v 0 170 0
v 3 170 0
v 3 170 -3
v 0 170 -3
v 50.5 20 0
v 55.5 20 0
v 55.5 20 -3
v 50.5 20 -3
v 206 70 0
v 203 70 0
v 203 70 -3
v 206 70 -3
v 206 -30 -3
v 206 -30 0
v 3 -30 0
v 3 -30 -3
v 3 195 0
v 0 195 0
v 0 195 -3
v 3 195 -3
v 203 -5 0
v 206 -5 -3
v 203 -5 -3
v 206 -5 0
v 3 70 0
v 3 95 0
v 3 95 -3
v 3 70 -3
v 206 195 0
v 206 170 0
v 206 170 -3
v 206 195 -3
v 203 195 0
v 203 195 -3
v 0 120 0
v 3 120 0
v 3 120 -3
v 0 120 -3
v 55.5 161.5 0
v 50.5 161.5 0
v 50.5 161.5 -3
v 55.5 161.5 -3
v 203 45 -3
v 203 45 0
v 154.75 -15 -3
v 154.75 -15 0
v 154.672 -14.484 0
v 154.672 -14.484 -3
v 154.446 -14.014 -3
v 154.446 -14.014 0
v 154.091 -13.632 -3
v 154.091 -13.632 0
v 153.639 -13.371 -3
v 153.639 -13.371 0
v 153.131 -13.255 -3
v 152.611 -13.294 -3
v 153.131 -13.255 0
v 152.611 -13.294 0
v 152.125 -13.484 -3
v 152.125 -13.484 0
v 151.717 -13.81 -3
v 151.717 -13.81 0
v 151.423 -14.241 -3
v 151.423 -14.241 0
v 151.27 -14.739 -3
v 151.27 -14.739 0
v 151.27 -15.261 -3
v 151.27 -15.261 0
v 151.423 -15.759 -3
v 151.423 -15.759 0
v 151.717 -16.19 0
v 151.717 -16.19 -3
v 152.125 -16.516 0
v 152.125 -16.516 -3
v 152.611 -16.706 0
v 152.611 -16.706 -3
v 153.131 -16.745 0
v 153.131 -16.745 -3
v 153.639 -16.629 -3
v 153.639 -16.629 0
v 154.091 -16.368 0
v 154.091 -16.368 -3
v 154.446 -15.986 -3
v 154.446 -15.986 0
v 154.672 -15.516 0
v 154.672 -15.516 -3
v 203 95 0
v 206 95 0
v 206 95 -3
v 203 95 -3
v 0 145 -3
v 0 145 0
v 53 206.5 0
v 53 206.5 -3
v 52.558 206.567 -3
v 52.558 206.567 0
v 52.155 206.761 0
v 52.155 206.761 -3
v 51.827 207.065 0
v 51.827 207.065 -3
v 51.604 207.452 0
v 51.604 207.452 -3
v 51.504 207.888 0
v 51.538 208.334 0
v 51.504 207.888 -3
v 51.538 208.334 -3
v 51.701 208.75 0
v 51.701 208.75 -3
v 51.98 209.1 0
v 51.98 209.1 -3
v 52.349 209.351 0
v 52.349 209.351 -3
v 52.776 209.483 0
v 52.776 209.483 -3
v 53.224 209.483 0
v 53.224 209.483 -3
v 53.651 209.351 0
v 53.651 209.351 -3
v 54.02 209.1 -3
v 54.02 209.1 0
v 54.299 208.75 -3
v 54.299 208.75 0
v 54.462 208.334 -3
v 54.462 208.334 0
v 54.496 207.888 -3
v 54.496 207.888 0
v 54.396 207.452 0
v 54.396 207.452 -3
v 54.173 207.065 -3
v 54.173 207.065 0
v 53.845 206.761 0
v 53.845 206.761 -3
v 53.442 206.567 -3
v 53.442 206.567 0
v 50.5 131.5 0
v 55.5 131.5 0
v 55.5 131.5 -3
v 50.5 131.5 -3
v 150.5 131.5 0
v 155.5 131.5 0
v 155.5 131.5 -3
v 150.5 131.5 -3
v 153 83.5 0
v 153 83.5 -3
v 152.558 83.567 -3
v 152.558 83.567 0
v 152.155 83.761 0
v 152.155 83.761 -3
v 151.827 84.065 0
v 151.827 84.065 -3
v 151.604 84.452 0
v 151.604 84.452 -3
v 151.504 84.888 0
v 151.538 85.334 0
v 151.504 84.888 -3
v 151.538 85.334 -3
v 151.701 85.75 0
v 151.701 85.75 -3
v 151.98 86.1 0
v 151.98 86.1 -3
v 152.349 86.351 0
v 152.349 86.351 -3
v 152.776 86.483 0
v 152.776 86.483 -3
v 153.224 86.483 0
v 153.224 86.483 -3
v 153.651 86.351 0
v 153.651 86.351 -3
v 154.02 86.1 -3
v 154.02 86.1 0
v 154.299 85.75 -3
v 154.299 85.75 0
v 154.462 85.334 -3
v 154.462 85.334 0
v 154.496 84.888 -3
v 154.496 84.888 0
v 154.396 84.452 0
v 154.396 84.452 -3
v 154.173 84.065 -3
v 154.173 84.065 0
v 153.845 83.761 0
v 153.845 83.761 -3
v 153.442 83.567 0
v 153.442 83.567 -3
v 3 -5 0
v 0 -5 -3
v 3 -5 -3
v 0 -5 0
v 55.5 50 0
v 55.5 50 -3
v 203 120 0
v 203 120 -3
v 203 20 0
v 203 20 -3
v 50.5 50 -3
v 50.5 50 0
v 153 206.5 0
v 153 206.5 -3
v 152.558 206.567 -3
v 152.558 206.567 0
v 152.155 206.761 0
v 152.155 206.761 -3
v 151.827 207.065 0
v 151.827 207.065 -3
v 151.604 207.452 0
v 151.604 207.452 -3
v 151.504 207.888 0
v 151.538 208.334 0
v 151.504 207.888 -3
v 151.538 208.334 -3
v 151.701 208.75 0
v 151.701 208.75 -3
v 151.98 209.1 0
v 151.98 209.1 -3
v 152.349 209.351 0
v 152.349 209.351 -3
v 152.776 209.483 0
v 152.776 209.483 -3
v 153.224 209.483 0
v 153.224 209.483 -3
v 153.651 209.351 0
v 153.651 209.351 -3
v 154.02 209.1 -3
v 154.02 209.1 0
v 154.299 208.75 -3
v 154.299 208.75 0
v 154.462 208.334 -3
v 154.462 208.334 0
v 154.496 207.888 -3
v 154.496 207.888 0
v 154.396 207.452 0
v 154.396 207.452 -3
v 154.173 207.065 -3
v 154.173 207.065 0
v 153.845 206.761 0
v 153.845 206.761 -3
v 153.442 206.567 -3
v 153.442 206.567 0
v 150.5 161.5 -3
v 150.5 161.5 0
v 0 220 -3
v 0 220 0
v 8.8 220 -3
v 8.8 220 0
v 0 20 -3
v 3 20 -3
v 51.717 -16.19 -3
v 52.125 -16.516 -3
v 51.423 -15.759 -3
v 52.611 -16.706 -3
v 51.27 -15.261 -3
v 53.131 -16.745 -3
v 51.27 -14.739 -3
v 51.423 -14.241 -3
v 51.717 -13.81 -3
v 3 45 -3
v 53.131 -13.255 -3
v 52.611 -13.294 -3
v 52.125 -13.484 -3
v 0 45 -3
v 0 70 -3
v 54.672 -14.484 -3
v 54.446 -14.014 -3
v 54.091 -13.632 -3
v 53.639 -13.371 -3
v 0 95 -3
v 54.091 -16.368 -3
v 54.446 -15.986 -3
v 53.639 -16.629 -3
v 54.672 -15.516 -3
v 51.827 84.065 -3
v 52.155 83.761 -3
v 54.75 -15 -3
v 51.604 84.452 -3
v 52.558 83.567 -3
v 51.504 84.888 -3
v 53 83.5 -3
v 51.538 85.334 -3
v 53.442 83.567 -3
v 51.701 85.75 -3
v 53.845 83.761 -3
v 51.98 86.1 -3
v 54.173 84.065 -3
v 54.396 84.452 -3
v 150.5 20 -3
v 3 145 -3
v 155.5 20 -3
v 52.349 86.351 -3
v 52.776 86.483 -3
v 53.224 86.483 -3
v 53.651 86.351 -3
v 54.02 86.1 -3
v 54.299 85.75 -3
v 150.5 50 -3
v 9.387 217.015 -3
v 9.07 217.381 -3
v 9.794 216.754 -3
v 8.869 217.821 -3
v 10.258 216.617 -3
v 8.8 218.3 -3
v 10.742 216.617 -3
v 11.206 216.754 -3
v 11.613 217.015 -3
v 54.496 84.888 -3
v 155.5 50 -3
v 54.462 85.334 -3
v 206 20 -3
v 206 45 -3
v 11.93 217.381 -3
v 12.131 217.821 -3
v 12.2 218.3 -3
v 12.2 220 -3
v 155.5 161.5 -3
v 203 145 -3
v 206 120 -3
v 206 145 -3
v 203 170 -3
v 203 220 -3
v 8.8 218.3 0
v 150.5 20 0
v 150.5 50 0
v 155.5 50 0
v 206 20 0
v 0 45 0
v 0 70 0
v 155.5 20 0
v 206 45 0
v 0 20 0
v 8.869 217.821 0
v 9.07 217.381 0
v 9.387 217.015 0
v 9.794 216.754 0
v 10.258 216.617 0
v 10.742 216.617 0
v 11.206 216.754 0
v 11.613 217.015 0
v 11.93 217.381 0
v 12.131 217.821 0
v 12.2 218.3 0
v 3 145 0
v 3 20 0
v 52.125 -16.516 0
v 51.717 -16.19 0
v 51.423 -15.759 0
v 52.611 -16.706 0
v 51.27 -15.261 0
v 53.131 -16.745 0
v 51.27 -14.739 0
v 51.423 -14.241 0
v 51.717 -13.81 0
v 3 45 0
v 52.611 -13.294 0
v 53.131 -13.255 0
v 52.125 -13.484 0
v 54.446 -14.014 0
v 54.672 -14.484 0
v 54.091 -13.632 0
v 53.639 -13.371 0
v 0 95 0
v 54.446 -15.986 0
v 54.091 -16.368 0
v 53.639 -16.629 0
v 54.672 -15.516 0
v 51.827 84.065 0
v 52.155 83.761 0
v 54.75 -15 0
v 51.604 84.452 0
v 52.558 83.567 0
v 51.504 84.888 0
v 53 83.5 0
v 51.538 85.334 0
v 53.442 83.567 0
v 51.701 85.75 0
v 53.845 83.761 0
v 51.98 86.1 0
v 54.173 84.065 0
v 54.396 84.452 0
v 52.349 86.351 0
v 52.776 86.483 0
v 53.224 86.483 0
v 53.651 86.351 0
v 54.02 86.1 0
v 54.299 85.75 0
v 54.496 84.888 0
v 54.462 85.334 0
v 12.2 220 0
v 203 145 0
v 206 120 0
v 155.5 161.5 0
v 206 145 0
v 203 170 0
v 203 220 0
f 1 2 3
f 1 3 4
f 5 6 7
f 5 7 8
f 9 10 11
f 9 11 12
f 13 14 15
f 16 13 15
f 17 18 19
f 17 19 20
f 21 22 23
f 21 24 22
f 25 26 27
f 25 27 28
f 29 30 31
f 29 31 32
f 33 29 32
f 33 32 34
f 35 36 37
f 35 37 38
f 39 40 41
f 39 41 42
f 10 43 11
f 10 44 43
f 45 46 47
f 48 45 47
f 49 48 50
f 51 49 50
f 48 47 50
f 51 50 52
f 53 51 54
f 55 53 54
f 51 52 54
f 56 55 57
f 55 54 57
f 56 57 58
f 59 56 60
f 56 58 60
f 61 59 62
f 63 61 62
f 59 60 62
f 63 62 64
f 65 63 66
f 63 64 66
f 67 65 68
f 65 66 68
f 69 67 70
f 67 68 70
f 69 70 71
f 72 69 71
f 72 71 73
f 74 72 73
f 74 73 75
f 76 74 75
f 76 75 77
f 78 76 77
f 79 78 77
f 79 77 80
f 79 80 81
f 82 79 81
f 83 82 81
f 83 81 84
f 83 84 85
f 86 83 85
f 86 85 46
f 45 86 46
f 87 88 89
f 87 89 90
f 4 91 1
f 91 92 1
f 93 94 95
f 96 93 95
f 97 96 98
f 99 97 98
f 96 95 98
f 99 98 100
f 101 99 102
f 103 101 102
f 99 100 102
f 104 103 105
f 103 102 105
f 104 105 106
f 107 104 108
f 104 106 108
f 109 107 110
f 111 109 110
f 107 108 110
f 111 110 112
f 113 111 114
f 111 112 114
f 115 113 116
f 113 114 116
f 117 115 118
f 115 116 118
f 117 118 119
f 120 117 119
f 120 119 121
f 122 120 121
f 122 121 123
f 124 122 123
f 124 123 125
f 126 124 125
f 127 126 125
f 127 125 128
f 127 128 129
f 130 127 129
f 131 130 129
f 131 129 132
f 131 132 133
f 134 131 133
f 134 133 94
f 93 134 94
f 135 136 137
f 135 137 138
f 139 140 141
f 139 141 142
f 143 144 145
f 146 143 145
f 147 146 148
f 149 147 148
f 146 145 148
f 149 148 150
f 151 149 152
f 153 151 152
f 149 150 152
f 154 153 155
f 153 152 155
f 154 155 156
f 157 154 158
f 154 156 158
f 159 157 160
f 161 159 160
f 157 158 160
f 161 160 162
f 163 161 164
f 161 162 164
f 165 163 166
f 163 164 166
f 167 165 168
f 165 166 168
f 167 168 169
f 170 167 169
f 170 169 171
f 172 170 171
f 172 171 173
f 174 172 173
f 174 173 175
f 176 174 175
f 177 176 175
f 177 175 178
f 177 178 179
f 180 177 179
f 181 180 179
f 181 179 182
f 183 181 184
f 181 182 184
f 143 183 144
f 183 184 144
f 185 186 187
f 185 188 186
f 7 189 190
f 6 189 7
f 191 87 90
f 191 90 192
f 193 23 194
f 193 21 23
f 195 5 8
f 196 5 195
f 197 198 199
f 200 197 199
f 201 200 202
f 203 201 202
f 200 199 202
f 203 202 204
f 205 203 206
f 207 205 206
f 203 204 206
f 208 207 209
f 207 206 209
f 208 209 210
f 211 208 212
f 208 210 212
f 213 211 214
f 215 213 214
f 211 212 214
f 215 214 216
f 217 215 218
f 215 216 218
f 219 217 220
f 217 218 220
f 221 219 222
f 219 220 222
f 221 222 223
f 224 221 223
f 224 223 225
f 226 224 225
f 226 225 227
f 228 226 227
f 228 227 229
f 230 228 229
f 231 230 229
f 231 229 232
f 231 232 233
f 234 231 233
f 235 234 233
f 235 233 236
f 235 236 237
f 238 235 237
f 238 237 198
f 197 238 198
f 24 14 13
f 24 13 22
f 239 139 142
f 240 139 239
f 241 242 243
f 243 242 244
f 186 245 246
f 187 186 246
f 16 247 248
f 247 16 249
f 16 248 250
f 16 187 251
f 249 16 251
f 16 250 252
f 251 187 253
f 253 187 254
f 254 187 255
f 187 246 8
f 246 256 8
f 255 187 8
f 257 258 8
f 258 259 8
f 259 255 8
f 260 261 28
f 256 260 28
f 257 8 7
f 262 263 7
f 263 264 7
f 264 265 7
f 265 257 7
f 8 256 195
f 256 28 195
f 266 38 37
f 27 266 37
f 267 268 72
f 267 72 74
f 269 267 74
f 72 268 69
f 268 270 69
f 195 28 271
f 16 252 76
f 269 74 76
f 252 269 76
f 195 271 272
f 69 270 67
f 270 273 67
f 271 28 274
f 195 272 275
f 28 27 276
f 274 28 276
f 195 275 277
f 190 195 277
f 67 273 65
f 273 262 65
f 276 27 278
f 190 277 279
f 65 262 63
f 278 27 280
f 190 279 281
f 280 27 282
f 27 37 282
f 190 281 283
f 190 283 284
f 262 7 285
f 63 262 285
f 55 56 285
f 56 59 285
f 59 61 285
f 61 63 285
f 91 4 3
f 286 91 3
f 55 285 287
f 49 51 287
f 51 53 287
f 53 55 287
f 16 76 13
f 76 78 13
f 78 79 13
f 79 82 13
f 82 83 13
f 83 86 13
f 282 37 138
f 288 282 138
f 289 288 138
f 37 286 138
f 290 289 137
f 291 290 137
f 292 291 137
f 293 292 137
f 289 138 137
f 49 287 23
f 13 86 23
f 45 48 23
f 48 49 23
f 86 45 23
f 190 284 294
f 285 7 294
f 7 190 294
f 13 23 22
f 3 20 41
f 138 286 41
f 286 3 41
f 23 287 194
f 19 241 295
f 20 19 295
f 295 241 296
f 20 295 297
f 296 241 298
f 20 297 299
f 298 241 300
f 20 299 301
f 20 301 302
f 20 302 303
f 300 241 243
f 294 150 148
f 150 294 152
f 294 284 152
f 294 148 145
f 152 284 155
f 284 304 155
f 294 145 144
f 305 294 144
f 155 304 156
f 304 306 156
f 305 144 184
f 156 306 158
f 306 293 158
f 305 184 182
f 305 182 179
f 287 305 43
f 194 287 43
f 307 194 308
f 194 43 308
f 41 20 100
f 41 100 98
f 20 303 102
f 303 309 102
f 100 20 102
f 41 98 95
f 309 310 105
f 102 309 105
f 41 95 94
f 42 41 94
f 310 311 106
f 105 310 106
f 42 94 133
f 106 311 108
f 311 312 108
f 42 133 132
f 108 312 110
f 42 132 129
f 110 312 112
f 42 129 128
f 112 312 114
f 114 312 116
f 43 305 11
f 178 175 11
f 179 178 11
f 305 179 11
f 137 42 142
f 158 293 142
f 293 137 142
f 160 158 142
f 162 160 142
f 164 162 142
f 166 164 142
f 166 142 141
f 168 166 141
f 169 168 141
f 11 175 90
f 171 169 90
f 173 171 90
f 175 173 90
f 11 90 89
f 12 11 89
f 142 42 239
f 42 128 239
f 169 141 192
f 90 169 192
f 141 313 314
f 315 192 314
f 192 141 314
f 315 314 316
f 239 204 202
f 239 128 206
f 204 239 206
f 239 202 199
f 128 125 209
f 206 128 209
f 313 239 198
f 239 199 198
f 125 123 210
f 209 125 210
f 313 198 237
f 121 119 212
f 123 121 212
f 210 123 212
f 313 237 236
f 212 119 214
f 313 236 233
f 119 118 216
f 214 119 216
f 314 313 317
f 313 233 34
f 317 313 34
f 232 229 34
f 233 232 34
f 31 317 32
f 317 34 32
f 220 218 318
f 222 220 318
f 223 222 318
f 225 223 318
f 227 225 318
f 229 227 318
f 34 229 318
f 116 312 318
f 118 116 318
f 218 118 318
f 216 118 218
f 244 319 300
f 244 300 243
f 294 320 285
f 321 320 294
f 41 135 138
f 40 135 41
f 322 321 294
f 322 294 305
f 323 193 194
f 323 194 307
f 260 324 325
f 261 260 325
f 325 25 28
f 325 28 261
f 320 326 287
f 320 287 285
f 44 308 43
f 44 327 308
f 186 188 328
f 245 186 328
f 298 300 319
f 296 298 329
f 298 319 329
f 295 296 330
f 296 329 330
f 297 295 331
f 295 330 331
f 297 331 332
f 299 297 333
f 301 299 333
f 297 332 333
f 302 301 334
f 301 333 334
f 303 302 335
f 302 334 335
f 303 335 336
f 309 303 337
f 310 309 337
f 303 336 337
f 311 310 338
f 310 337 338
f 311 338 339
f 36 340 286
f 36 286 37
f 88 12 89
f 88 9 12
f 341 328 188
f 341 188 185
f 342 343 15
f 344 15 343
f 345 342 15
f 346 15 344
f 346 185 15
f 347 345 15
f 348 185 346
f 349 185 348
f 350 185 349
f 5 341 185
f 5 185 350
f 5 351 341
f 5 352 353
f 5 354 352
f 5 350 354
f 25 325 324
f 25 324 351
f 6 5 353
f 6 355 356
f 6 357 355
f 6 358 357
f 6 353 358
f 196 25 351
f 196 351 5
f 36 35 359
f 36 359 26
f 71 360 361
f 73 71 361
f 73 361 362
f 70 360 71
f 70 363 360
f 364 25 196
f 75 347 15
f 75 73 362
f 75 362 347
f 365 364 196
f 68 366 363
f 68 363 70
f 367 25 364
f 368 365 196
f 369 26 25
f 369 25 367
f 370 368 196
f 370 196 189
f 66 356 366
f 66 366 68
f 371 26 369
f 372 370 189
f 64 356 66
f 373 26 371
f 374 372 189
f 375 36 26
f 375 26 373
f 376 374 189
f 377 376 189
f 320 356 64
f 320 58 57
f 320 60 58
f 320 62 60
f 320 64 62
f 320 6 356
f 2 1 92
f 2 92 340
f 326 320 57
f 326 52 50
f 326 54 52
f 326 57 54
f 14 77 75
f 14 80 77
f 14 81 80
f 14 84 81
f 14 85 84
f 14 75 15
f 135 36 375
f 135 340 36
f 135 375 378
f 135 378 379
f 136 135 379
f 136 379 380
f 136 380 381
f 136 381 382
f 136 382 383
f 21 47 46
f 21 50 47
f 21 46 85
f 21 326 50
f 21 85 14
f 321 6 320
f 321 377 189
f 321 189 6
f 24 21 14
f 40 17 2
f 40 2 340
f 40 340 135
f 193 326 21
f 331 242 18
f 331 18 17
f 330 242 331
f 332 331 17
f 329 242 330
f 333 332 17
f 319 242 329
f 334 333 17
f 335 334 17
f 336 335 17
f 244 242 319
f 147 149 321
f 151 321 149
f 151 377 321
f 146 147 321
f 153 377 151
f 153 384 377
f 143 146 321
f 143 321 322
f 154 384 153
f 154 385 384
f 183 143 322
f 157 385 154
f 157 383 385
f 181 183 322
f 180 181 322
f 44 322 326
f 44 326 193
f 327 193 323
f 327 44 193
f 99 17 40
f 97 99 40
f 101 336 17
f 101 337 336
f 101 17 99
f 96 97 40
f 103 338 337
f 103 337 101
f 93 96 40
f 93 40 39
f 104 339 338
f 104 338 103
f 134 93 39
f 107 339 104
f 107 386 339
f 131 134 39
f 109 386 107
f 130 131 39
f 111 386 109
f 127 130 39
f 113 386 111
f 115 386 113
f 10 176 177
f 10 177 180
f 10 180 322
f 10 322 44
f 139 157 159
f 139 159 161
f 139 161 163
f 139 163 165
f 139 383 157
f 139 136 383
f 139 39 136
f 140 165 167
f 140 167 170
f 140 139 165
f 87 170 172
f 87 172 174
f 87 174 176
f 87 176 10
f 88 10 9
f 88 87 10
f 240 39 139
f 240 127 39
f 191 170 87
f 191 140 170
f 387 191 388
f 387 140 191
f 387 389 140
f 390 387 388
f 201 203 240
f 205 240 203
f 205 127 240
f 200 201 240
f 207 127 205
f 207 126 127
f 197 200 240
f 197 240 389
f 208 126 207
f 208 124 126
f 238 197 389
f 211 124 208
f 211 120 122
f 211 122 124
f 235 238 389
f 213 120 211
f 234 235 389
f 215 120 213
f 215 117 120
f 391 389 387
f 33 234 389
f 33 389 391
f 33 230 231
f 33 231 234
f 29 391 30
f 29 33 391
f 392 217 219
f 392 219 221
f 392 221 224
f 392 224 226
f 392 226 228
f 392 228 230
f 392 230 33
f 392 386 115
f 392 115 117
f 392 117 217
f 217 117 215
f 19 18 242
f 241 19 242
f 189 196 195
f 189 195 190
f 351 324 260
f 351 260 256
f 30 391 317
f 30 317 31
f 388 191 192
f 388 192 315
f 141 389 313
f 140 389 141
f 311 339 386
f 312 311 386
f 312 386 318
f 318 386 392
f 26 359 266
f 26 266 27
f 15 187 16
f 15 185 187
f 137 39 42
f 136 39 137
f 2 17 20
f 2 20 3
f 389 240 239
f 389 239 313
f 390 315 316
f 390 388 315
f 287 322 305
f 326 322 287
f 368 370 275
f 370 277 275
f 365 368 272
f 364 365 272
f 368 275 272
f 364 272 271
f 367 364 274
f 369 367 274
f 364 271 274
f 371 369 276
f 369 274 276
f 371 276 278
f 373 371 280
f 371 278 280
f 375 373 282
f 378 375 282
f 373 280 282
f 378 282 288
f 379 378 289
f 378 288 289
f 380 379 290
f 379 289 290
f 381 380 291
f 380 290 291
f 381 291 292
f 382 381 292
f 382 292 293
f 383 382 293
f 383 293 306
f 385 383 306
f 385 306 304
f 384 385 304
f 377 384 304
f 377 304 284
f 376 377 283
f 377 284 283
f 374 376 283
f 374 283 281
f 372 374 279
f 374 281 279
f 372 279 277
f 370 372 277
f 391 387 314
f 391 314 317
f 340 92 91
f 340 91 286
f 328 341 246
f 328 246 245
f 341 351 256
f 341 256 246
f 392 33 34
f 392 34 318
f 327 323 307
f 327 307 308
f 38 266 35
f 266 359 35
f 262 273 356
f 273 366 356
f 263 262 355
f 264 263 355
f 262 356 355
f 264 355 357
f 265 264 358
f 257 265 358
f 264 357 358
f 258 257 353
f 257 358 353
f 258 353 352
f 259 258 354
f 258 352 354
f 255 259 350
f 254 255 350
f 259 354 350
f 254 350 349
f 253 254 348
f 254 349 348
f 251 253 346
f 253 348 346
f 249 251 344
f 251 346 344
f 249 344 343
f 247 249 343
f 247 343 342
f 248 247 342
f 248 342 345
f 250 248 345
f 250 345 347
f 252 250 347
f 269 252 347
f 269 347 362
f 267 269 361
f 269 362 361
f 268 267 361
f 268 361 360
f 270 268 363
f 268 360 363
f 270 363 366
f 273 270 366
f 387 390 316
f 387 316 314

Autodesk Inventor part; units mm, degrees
ref_plane "YZ Plane" through (0, 0, 0) normal (1, 0, 0) x (0, 1, 0)
ref_plane "XZ Plane" through (0, 0, 0) normal (0, 1, 0) x (-1, 0, 0)
ref_plane "XY Plane" through (0, 0, 0) normal (0, 0, 1) x (1, 0, 0)
sketch "Boceto1" plane through (0, 0, 0) normal (0, 0, 1) x (1, 0, 0)
  line L0 (206, -30) -> (206, 220) projected
  line L1 (0, 220) -> (206, 220) projected
  line L2 (0, -30) -> (0, 220) projected
  line L3 (206, -30) -> (0, -30) projected
  line L4 (206, -30) -> (206, -5)
  line L5 (206, -5) -> (203, -5)
  line L6 (203, -5) -> (203, 20)
  line L7 (203, 20) -> (206, 20)
  line L8 (206, 20) -> (206, 45)
  line L9 (206, 45) -> (203, 45)
  line L10 (203, 45) -> (203, 70)
  line L11 (203, 70) -> (206, 70)
  line L12 (206, 70) -> (206, 95)
  line L13 (206, 95) -> (203, 95)
  line L14 (203, 95) -> (203, 120)
  line L15 (203, 120) -> (206, 120)
  line L16 (206, 120) -> (206, 145)
  line L17 (206, 145) -> (203, 145)
  line L18 (203, 145) -> (203, 170)
  line L19 (203, 170) -> (206, 170)
  line L20 (203, 220) -> (206, 220)
  line L21 (206, 195) -> (203, 195)
  line L22 (203, 195) -> (203, 220)
  line L23 (206, 170) -> (206, 195)
  line L24 (203, 170) -> (206, 170)
  line L25 (0, 220) -> (0, 195)
  line L26 (0, 195) -> (3, 195)
  line L27 (3, 195) -> (3, 170)
  line L28 (3, 170) -> (0, 170)
  line L29 (0, 170) -> (0, 145)
  line L30 (0, 145) -> (3, 145)
  line L31 (3, 145) -> (3, 120)
  line L32 (3, 120) -> (0, 120)
  line L33 (3, 20) -> (0, 20)
  line L34 (0, 45) -> (3, 45)
  line L35 (3, 45) -> (3, 20)
  line L36 (0, 70) -> (0, 45)
  line L37 (3, 70) -> (0, 70)
  line L38 (3, 95) -> (3, 70)
  line L39 (0, 95) -> (3, 95)
  line L40 (0, 120) -> (0, 95)
  line L41 (3, 20) -> (0, 20)
  line L42 (0, 20) -> (0, -5)
  line L43 (0, -5) -> (3, -5)
  line L44 (3, -5) -> (3, -30)
  line L45 (3, -30) -> (0, -30)
  line L46 (203, 220) -> (206, 220)
  line L47 (203, 220) -> (206, 220)
  line L48 (206, 220) -> (206, 245)
  line L49 (206, 245) -> (203, 245)
  line L50 (203, 245) -> (203, 270)
  line L51 (203, 270) -> (206, 270)
  line L52 (0, 220) -> (3, 220)
  line L53 (0, 220) -> (3, 220)
  line L54 (3, 220) -> (3, 245)
  line L55 (3, 245) -> (0, 245)
  line L56 (0, 245) -> (0, 270)
  line L57 (0, 270) -> (3, 270)
  line L58 (206, 270) -> (0, 270)
  point P0 (0, 0)
  dimension "d78" = 3
  dimension "d88" = 3
  dimension "Lengueta" = 25
  dimension "espesor" = 3
  dimension "d2" = 25
  dimension "d3" = 3
  dimension "d4" = 25
  dimension "d5" = 90
  dimension "d6" = 3
  dimension "d7" = 25
  dimension "d8" = 3
  dimension "d9" = 25
  dimension "d10" = 3
  dimension "d11" = 25
  dimension "d12" = 3
  dimension "d13" = 25
  dimension "d14" = 90
  dimension "d15" = 3
  dimension "d16" = 25
  dimension "d17" = 3
  dimension "d18" = 3
  dimension "d19" = 25
  dimension "d20" = 90
  dimension "d21" = 3
  dimension "d22" = 25
  dimension "d23" = 3
  dimension "d26" = 25
  dimension "d27" = 3
  dimension "d28" = 25
  dimension "d29" = 3
  dimension "d30" = 25
  dimension "d31" = 90
  dimension "d32" = 3
  dimension "d33" = 25
  dimension "d34" = 3
  dimension "d35" = 25
  dimension "d36" = 3
  dimension "d37" = 25
  dimension "d38" = 3
  dimension "d39" = 25
  dimension "d40" = 90
  dimension "d41" = 3
  dimension "d42" = 25
  dimension "d43" = 3
  dimension "d44" = 3
  dimension "d45" = 25
  dimension "d46" = 90
  dimension "d47" = 3
  dimension "d48" = 25
  dimension "d49" = 3
  dimension "d71" = 3
  dimension "d72" = 3
  dimension "d73" = 25
  dimension "d74" = 90
  dimension "d75" = 3
  dimension "d76" = 25
  dimension "d77" = 3
  dimension "d81" = 3
  dimension "d82" = 3
  dimension "d83" = 25
  dimension "d84" = 90
  dimension "d85" = 3
  dimension "d86" = 25
  dimension "d87" = 3
extrude "Extrusión1" add sketch "Boceto1" against normal blind 3 contours L3 L44 L43 L2 L33 L35 L34 L37 L38 L39 L32 L31 L30 L28 L27 L26 L1 L22 L21 L0 L19 L18 L17 L15 L14 L13 L11 L10 L9 L7 L6 L5
sketch "Boceto2" plane through (0, 0, 0) normal (0, 0, 1) x (1, 0, 0)
  circle A0 centre (53, -15) radius 1.75
  circle A1 centre (153, -15) radius 1.75
  point P0 (0, 0)
extrude "Extrusión2" cut sketch "Boceto2" against normal blind 3
sketch "Boceto3" plane through (0, 0, 0) normal (0, 0, 1) x (1, 0, 0)
  circle A0 centre (53, 208) radius 2.1
  circle A1 centre (53, 208) radius 1.5
  circle A2 centre (153, 208) radius 2.1
  point P0 (0, 0)
  dimension "d56" = 3
hole "Agujero1" at (53, 208, 0) at (153, 208, 0) direction (0, 0, -1) diameter 3 depth 4
sketch "Boceto4" plane through (0, 0, 0) normal (0, 0, 1) x (1, 0, 0)
  circle A0 centre (53, 85) radius 2.1 projected
  circle A1 centre (153, 85) radius 2.1 projected
  point P0 (0, 0)
hole "Agujero2" at (153, 85, 0) at (53, 85, 0) direction (0, 0, -1) diameter 3 depth 4
sketch "Boceto5" plane through (0, 0, -3) normal (0, 0, -1) x (-1, 0, 0)
  point P0 (0, 0)
sketch "Boceto6" plane through (0, 0, 0) normal (0, 0, 1) x (1, 0, 0)
  circle A0 centre (53, 85) radius 1.5 projected
  circle A1 centre (153, 85) radius 1.5 projected
  circle A2 centre (153, 208) radius 1.5 projected
  circle A3 centre (53, 208) radius 1.5 projected
  circle A4 centre (53, -15) radius 1.75 projected
  circle A5 centre (153, -15) radius 1.75 projected
  line L0 (203, 20) -> (206, 20) projected
  line L1 (206, 20) -> (206, 45) projected
  line L2 (206, 45) -> (203, 45) projected
  line L3 (203, 45) -> (203, 70) projected
  line L4 (203, 70) -> (206, 70) projected
  line L5 (206, 70) -> (206, 95) projected
  line L6 (206, 95) -> (203, 95) projected
  line L7 (203, 95) -> (203, 120) projected
  line L8 (203, 120) -> (206, 120) projected
  line L9 (206, 120) -> (206, 145) projected
  line L10 (206, 145) -> (203, 145) projected
  line L11 (203, 145) -> (203, 170) projected
  line L12 (203, 170) -> (206, 170) projected
  line L13 (206, 170) -> (206, 195) projected
  line L14 (206, 195) -> (203, 195) projected
  line L15 (203, 195) -> (203, 220) projected
  line L16 (203, 220) -> (0, 220) projected
  line L17 (0, 220) -> (0, 195) projected
  line L18 (0, 195) -> (3, 195) projected
  line L19 (3, 195) -> (3, 170) projected
  line L20 (3, 170) -> (0, 170) projected
  line L21 (0, 170) -> (0, 145) projected
  line L22 (0, 145) -> (3, 145) projected
  line L23 (3, 145) -> (3, 120) projected
  line L24 (3, 120) -> (0, 120) projected
  line L25 (0, 120) -> (0, 95) projected
  line L26 (0, 95) -> (3, 95) projected
  line L27 (3, 95) -> (3, 70) projected
  line L28 (3, 70) -> (0, 70) projected
  line L29 (0, 70) -> (0, 45) projected
  line L30 (0, 45) -> (3, 45) projected
  line L31 (3, 45) -> (3, 20) projected
  line L32 (3, 20) -> (0, 20) projected
  line L33 (0, 20) -> (0, -5) projected
  line L34 (0, -5) -> (3, -5) projected
  line L35 (3, -5) -> (3, -30) projected
  line L36 (3, -30) -> (206, -30) projected
  line L37 (206, -30) -> (206, -5) projected
  line L38 (206, -5) -> (203, -5) projected
  line L39 (203, -5) -> (203, 20) projected
  line L40 (153, 85) -> (153, 208)
  line L41 (150.5, 161.5) -> (155.5, 161.5)
  line L42 (155.5, 161.5) -> (155.5, 131.5)
  line L43 (155.5, 131.5) -> (150.5, 131.5)
  line L44 (150.5, 131.5) -> (150.5, 161.5)
  line L45 (150.5, 161.5) -> (155.5, 131.5) construction
  line L46 (155.5, 161.5) -> (150.5, 131.5) construction
  line L47 (53, 85) -> (53, 208)
  line L48 (50.5, 161.5) -> (55.5, 161.5)
  line L49 (55.5, 161.5) -> (55.5, 131.5)
  line L50 (55.5, 131.5) -> (50.5, 131.5)
  line L51 (50.5, 131.5) -> (50.5, 161.5)
  line L52 (50.5, 161.5) -> (55.5, 131.5) construction
  line L53 (55.5, 161.5) -> (50.5, 131.5) construction
  line L54 (53, -15) -> (53, 85)
  line L55 (50.5, 50) -> (55.5, 50)
  line L56 (55.5, 50) -> (55.5, 20)
  line L57 (55.5, 20) -> (50.5, 20)
  line L58 (50.5, 20) -> (50.5, 50)
  line L59 (50.5, 50) -> (55.5, 20) construction
  line L60 (55.5, 50) -> (50.5, 20) construction
  line L61 (150.5, 50) -> (155.5, 50)
  line L62 (155.5, 50) -> (155.5, 20)
  line L63 (155.5, 20) -> (150.5, 20)
  line L64 (150.5, 20) -> (150.5, 50)
  line L65 (150.5, 50) -> (155.5, 20) construction
  line L66 (155.5, 50) -> (150.5, 20) construction
  point P0 (0, 0)
  point P1 (153, 146.5)
  point P2 (53, 146.5)
  point P3 (53, 35)
  point P4 (153, 35)
  dimension "d93" = 5
  dimension "d94" = 30
  dimension "d95" = 5
  dimension "d96" = 30
  dimension "d99" = 5
  dimension "d100" = 30
  dimension "d101" = 5
  dimension "d102" = 30
extrude "Extrusión3" cut sketch "Boceto6" against normal blind 3 contours L55 L56 L57 L54 | L54 L57 L58 L55 | L50 L51 L48 L47 | L47 L48 L49 L50 | L43 L44 L41 L40 | L40 L41 L42 L43 | L61 L62 L63 L64
sketch "Boceto7" plane through (0, 0, 0) normal (0, 0, 1) x (1, 0, 0)
  line L0 (203, 220) -> (0, 220) projected
  line L1 (0, 220) -> (3, 220)
  line L2 (3, 220) -> (10.5, 220)
  line L3 (10.5, 220) -> (10.5, 216.6)
  circle A0 centre (10.5, 218.3) radius 1.7
  line L4 (8.8, 218.3) -> (8.8, 220)
  line L5 (12.2, 218.3) -> (12.2, 220)
  point P0 (0, 0)
  dimension "d105" = 3
  dimension "d106" = 7.5
  dimension "d107" = 3.4
extrude "Extrusión4" cut sketch "Boceto7" against normal blind 10
equation "\"d2\" = Lengueta"
equation "\"d3\" = espesor"
equation "\"d4\" = Lengueta"
equation "\"d6\" = espesor"
equation "\"d7\" = Lengueta"
equation "\"d8\" = espesor"
equation "\"d11\" = d9"
equation "\"d12\" = d10"
equation "\"d13\" = d9"
equation "\"d16\" = d9"
equation "\"d18\" = d24"
equation "\"d19\" = d25"
equation "\"d22\" = d25"
equation "\"d28\" = d26"
equation "\"d29\" = d27"
equation "\"d30\" = d26"
equation "\"d33\" = d26"
equation "\"d37\" = d35"
equation "\"d38\" = d36"
equation "\"d39\" = d35"
equation "\"d42\" = d35"
equation "\"d44\" = d50"
equation "\"d45\" = d51"
equation "\"d48\" = d51"
equation "\"d71\" = d78"
equation "\"d72\" = d79"
equation "\"d73\" = d80"
equation "\"d76\" = d80"
equation "\"d81\" = d88"
equation "\"d82\" = d89"
equation "\"d83\" = d90"
equation "\"d86\" = d90"
equation "\"d52\" = espesor"
equation "\"d54\" = espesor"
equation "\"d24\" = 3"
equation "\"d25\" = 25"
equation "\"d50\" = 3"
equation "\"d51\" = 25"
equation "\"d79\" = 3"
equation "\"d80\" = 25"
equation "\"d89\" = 3"
equation "\"d90\" = 25"
properties part number "Envolvente_Pared_Derecha"
